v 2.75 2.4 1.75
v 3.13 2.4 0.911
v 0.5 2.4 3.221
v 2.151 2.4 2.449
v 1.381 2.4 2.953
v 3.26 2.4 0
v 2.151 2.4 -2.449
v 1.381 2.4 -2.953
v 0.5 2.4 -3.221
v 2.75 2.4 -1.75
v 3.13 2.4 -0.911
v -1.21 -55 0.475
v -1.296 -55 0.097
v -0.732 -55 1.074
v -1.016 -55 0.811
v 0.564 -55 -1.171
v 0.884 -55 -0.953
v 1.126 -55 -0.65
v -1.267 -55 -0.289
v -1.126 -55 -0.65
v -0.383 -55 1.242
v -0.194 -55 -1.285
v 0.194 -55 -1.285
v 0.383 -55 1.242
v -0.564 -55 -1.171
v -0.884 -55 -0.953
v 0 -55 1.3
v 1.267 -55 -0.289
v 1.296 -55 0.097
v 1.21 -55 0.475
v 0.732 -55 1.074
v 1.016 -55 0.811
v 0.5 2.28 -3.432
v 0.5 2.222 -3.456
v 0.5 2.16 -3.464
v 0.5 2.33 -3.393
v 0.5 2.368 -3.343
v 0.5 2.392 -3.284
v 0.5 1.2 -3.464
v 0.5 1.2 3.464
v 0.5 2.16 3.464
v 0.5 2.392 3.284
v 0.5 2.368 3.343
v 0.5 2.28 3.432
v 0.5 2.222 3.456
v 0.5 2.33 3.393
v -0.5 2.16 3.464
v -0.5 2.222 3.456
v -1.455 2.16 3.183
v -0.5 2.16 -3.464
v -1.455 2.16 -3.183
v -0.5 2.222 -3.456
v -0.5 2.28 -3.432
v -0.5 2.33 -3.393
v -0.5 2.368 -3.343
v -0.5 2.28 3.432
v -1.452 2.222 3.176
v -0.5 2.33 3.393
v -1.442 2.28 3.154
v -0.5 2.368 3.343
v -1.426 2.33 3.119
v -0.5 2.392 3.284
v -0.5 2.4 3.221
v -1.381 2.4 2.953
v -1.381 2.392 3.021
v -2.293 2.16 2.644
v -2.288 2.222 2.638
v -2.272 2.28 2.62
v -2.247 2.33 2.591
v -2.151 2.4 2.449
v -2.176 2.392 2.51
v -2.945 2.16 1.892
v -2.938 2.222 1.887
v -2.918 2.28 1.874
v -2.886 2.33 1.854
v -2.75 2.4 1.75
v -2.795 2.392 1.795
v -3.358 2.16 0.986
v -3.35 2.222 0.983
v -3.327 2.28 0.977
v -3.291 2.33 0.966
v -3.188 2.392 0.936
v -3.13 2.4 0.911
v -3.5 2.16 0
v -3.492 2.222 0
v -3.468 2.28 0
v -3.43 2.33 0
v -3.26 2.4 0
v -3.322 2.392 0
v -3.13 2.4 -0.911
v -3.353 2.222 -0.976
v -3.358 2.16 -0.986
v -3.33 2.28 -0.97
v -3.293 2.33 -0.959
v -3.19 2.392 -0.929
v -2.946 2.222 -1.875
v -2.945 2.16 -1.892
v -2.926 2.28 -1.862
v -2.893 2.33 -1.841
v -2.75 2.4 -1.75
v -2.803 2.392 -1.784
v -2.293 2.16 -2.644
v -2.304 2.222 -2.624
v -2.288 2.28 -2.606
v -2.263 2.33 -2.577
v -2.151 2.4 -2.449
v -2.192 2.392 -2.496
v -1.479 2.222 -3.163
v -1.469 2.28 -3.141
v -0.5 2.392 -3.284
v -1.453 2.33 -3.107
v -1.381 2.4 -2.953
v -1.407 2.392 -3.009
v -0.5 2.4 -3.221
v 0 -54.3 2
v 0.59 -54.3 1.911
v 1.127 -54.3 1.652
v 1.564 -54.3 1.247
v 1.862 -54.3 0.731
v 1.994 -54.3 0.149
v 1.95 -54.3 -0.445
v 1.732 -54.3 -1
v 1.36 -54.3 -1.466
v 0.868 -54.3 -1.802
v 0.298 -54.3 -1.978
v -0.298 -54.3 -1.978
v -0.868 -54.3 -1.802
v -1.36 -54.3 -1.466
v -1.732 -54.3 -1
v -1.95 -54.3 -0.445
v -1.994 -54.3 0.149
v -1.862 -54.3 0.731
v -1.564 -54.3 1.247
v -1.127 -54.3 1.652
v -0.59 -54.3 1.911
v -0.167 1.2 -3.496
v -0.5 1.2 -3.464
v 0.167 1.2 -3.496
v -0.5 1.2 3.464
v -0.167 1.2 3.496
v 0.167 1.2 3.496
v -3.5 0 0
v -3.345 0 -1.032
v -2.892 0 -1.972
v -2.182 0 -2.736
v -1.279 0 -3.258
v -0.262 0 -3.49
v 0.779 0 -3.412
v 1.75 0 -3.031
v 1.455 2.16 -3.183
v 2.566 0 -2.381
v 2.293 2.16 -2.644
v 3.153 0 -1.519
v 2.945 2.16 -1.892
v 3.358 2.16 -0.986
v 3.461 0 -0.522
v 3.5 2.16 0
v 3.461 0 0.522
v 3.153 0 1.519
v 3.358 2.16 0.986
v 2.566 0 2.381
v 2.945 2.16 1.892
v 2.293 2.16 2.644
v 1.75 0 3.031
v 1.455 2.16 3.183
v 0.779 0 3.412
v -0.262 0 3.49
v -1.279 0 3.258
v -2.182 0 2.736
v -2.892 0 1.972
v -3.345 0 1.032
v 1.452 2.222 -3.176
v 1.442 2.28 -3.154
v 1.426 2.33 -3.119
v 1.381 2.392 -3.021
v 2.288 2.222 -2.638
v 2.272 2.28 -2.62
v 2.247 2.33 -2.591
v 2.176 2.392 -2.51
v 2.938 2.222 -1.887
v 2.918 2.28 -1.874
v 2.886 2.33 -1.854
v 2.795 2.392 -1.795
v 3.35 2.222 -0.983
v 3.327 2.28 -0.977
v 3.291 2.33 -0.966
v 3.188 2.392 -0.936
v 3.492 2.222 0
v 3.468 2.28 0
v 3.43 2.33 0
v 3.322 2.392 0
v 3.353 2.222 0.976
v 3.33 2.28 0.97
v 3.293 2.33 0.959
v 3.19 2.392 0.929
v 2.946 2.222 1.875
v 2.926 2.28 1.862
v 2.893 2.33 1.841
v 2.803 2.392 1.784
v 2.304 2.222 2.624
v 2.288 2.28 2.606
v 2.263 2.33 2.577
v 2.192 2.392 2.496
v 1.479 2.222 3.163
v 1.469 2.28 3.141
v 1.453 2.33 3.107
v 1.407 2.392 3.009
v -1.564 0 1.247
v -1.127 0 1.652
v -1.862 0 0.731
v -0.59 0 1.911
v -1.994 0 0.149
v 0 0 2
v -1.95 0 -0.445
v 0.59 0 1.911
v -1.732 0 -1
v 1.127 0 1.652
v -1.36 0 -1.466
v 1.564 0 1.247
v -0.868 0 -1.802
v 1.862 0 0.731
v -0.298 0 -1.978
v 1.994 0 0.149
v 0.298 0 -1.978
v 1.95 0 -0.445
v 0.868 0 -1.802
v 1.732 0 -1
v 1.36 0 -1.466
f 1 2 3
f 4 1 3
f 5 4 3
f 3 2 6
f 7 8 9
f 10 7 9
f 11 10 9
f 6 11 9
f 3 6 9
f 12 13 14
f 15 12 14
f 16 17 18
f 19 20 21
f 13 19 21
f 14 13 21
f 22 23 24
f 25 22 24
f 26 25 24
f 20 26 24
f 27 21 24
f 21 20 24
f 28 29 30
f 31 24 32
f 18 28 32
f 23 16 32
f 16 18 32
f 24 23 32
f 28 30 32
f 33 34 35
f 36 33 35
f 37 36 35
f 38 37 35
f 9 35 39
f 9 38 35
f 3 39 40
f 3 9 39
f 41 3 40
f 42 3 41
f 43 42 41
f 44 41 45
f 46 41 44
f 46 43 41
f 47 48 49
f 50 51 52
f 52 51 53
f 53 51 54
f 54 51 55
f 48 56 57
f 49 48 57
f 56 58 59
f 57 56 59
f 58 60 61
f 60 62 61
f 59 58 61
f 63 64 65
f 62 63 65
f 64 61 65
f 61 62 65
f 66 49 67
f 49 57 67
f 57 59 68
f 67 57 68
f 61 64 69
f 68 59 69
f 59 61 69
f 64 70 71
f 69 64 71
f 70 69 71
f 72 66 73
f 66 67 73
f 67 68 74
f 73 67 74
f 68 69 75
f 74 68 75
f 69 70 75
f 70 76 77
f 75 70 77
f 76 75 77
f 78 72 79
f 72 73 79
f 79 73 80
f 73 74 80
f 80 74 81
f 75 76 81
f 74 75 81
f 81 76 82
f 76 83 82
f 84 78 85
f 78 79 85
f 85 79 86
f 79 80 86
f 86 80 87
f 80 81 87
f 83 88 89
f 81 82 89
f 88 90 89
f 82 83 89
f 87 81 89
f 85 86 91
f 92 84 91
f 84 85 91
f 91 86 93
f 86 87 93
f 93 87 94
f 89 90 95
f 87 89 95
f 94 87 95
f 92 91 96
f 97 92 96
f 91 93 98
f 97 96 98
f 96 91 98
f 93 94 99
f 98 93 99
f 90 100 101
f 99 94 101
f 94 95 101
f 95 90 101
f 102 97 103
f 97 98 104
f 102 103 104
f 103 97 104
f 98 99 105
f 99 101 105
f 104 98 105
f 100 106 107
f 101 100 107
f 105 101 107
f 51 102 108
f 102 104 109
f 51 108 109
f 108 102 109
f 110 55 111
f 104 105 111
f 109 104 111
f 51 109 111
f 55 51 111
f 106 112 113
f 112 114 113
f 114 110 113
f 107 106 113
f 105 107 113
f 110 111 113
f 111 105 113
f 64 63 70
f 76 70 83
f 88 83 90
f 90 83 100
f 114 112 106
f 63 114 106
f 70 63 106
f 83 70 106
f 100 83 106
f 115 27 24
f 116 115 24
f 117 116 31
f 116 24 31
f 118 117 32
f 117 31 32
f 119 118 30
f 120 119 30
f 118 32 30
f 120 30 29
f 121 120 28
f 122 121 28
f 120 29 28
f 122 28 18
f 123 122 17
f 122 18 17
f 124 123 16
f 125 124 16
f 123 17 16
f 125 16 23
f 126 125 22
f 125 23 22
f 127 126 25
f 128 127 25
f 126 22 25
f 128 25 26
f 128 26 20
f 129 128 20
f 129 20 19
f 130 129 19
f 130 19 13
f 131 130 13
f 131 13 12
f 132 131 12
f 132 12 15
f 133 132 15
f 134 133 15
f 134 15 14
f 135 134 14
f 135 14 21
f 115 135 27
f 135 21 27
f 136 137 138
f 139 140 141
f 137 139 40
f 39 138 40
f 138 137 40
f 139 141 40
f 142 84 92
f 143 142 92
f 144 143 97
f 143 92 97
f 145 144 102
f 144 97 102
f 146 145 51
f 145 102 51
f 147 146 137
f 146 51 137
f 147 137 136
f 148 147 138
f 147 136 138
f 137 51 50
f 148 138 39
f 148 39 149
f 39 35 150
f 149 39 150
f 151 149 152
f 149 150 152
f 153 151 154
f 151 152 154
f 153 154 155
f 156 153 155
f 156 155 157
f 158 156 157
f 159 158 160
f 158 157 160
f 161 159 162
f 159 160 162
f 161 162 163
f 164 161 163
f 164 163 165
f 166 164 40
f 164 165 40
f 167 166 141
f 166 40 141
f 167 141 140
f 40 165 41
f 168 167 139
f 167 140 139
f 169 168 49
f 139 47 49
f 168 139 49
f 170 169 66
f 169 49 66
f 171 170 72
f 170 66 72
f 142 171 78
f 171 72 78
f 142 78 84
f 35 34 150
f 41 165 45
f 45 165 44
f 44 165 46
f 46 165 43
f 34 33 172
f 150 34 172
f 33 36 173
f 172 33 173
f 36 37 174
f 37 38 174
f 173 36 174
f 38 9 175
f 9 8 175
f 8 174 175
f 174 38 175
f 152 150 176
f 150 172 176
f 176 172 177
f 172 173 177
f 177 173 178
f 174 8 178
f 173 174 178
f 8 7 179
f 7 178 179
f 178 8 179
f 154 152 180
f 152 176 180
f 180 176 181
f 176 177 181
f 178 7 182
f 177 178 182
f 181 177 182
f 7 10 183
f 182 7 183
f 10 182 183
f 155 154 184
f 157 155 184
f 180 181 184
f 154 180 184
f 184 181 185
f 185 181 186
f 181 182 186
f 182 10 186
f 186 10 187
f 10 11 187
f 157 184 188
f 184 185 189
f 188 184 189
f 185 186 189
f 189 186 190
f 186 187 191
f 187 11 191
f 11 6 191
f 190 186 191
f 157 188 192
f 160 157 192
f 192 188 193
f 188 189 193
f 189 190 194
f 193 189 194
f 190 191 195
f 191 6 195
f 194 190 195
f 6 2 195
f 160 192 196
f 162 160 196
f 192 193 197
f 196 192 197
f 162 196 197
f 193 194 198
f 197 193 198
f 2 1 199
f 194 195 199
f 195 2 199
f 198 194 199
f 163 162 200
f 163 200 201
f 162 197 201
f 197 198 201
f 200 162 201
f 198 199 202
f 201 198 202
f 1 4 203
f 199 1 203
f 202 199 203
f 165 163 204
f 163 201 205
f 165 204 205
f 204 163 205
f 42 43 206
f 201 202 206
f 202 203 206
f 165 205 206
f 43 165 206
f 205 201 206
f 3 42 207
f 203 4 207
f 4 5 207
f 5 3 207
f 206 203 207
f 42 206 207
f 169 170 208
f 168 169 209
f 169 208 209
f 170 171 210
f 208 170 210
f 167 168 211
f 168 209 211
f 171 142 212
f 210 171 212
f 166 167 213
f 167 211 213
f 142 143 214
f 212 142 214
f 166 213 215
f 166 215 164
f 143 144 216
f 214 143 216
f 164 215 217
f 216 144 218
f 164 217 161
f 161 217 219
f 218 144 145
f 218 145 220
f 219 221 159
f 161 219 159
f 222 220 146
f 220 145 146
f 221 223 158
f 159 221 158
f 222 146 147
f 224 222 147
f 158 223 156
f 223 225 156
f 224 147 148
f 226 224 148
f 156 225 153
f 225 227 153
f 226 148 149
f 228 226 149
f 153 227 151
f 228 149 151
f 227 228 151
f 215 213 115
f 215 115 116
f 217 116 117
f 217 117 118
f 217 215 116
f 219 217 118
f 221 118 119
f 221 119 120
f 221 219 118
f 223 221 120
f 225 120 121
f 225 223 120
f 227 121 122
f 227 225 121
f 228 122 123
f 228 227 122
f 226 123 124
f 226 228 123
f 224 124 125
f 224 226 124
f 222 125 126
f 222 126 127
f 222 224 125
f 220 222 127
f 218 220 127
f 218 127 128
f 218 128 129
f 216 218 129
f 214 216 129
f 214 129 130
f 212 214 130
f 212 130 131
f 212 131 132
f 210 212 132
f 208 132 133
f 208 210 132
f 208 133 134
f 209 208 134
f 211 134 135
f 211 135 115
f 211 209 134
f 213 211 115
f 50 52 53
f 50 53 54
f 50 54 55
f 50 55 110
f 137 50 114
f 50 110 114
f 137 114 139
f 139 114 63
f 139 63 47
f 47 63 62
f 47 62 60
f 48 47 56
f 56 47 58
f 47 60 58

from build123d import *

# Parameters (mm, degrees)
ESQUISSE1_R             = 2
TIGE_DEPTH              = 55
CHANFREIN_D_ENTR_E_SIZE = 0.7
ESQUISSE3_W             = 1
ESQUISSE3_H             = 7
FENTE_DEPTH             = 1.2


with BuildPart() as part:
    # Esquisse1 → Tige (new body)
    with BuildSketch(Plane(origin=(0, 0, 0), x_dir=(1, 0, 0), z_dir=(0, 1, 0))):
        Circle(ESQUISSE1_R)
    extrude(amount=-TIGE_DEPTH)

    # Chanfrein d'entrée
    chanfrein_d_entr_e_edges = [part.edges().sort_by_distance(p)[0] for p in [
        (-2, -55, 0),
    ]]
    chamfer(chanfrein_d_entr_e_edges, length=CHANFREIN_D_ENTR_E_SIZE)

    # Esquisse2 → Tête (revolve)
    with BuildSketch(Plane.XY):
        with BuildLine():
            Line((0, 0), (3.5, 0))
            Line((3.5, 0), (3.5, 2.16))
            ThreePointArc((3.5, 2.16), (3.429705627, 2.329705627), (3.26, 2.4))
            Line((3.26, 2.4), (0, 2.4))
            Line((0, 2.4), (0, 0))
        make_face()
    revolve(axis=Axis((0, 2.4, 0), (0, -1, 0)))

    # Esquisse3 → Fente (cut)
    with BuildSketch(Plane(origin=(0, 2.4, -1.8), x_dir=(1, 0, 0), z_dir=(0, -1, 0))):
        with Locations((0, 1.8)):
            Rectangle(ESQUISSE3_W, ESQUISSE3_H)
    extrude(amount=FENTE_DEPTH, mode=Mode.SUBTRACT)


solid = part.part
